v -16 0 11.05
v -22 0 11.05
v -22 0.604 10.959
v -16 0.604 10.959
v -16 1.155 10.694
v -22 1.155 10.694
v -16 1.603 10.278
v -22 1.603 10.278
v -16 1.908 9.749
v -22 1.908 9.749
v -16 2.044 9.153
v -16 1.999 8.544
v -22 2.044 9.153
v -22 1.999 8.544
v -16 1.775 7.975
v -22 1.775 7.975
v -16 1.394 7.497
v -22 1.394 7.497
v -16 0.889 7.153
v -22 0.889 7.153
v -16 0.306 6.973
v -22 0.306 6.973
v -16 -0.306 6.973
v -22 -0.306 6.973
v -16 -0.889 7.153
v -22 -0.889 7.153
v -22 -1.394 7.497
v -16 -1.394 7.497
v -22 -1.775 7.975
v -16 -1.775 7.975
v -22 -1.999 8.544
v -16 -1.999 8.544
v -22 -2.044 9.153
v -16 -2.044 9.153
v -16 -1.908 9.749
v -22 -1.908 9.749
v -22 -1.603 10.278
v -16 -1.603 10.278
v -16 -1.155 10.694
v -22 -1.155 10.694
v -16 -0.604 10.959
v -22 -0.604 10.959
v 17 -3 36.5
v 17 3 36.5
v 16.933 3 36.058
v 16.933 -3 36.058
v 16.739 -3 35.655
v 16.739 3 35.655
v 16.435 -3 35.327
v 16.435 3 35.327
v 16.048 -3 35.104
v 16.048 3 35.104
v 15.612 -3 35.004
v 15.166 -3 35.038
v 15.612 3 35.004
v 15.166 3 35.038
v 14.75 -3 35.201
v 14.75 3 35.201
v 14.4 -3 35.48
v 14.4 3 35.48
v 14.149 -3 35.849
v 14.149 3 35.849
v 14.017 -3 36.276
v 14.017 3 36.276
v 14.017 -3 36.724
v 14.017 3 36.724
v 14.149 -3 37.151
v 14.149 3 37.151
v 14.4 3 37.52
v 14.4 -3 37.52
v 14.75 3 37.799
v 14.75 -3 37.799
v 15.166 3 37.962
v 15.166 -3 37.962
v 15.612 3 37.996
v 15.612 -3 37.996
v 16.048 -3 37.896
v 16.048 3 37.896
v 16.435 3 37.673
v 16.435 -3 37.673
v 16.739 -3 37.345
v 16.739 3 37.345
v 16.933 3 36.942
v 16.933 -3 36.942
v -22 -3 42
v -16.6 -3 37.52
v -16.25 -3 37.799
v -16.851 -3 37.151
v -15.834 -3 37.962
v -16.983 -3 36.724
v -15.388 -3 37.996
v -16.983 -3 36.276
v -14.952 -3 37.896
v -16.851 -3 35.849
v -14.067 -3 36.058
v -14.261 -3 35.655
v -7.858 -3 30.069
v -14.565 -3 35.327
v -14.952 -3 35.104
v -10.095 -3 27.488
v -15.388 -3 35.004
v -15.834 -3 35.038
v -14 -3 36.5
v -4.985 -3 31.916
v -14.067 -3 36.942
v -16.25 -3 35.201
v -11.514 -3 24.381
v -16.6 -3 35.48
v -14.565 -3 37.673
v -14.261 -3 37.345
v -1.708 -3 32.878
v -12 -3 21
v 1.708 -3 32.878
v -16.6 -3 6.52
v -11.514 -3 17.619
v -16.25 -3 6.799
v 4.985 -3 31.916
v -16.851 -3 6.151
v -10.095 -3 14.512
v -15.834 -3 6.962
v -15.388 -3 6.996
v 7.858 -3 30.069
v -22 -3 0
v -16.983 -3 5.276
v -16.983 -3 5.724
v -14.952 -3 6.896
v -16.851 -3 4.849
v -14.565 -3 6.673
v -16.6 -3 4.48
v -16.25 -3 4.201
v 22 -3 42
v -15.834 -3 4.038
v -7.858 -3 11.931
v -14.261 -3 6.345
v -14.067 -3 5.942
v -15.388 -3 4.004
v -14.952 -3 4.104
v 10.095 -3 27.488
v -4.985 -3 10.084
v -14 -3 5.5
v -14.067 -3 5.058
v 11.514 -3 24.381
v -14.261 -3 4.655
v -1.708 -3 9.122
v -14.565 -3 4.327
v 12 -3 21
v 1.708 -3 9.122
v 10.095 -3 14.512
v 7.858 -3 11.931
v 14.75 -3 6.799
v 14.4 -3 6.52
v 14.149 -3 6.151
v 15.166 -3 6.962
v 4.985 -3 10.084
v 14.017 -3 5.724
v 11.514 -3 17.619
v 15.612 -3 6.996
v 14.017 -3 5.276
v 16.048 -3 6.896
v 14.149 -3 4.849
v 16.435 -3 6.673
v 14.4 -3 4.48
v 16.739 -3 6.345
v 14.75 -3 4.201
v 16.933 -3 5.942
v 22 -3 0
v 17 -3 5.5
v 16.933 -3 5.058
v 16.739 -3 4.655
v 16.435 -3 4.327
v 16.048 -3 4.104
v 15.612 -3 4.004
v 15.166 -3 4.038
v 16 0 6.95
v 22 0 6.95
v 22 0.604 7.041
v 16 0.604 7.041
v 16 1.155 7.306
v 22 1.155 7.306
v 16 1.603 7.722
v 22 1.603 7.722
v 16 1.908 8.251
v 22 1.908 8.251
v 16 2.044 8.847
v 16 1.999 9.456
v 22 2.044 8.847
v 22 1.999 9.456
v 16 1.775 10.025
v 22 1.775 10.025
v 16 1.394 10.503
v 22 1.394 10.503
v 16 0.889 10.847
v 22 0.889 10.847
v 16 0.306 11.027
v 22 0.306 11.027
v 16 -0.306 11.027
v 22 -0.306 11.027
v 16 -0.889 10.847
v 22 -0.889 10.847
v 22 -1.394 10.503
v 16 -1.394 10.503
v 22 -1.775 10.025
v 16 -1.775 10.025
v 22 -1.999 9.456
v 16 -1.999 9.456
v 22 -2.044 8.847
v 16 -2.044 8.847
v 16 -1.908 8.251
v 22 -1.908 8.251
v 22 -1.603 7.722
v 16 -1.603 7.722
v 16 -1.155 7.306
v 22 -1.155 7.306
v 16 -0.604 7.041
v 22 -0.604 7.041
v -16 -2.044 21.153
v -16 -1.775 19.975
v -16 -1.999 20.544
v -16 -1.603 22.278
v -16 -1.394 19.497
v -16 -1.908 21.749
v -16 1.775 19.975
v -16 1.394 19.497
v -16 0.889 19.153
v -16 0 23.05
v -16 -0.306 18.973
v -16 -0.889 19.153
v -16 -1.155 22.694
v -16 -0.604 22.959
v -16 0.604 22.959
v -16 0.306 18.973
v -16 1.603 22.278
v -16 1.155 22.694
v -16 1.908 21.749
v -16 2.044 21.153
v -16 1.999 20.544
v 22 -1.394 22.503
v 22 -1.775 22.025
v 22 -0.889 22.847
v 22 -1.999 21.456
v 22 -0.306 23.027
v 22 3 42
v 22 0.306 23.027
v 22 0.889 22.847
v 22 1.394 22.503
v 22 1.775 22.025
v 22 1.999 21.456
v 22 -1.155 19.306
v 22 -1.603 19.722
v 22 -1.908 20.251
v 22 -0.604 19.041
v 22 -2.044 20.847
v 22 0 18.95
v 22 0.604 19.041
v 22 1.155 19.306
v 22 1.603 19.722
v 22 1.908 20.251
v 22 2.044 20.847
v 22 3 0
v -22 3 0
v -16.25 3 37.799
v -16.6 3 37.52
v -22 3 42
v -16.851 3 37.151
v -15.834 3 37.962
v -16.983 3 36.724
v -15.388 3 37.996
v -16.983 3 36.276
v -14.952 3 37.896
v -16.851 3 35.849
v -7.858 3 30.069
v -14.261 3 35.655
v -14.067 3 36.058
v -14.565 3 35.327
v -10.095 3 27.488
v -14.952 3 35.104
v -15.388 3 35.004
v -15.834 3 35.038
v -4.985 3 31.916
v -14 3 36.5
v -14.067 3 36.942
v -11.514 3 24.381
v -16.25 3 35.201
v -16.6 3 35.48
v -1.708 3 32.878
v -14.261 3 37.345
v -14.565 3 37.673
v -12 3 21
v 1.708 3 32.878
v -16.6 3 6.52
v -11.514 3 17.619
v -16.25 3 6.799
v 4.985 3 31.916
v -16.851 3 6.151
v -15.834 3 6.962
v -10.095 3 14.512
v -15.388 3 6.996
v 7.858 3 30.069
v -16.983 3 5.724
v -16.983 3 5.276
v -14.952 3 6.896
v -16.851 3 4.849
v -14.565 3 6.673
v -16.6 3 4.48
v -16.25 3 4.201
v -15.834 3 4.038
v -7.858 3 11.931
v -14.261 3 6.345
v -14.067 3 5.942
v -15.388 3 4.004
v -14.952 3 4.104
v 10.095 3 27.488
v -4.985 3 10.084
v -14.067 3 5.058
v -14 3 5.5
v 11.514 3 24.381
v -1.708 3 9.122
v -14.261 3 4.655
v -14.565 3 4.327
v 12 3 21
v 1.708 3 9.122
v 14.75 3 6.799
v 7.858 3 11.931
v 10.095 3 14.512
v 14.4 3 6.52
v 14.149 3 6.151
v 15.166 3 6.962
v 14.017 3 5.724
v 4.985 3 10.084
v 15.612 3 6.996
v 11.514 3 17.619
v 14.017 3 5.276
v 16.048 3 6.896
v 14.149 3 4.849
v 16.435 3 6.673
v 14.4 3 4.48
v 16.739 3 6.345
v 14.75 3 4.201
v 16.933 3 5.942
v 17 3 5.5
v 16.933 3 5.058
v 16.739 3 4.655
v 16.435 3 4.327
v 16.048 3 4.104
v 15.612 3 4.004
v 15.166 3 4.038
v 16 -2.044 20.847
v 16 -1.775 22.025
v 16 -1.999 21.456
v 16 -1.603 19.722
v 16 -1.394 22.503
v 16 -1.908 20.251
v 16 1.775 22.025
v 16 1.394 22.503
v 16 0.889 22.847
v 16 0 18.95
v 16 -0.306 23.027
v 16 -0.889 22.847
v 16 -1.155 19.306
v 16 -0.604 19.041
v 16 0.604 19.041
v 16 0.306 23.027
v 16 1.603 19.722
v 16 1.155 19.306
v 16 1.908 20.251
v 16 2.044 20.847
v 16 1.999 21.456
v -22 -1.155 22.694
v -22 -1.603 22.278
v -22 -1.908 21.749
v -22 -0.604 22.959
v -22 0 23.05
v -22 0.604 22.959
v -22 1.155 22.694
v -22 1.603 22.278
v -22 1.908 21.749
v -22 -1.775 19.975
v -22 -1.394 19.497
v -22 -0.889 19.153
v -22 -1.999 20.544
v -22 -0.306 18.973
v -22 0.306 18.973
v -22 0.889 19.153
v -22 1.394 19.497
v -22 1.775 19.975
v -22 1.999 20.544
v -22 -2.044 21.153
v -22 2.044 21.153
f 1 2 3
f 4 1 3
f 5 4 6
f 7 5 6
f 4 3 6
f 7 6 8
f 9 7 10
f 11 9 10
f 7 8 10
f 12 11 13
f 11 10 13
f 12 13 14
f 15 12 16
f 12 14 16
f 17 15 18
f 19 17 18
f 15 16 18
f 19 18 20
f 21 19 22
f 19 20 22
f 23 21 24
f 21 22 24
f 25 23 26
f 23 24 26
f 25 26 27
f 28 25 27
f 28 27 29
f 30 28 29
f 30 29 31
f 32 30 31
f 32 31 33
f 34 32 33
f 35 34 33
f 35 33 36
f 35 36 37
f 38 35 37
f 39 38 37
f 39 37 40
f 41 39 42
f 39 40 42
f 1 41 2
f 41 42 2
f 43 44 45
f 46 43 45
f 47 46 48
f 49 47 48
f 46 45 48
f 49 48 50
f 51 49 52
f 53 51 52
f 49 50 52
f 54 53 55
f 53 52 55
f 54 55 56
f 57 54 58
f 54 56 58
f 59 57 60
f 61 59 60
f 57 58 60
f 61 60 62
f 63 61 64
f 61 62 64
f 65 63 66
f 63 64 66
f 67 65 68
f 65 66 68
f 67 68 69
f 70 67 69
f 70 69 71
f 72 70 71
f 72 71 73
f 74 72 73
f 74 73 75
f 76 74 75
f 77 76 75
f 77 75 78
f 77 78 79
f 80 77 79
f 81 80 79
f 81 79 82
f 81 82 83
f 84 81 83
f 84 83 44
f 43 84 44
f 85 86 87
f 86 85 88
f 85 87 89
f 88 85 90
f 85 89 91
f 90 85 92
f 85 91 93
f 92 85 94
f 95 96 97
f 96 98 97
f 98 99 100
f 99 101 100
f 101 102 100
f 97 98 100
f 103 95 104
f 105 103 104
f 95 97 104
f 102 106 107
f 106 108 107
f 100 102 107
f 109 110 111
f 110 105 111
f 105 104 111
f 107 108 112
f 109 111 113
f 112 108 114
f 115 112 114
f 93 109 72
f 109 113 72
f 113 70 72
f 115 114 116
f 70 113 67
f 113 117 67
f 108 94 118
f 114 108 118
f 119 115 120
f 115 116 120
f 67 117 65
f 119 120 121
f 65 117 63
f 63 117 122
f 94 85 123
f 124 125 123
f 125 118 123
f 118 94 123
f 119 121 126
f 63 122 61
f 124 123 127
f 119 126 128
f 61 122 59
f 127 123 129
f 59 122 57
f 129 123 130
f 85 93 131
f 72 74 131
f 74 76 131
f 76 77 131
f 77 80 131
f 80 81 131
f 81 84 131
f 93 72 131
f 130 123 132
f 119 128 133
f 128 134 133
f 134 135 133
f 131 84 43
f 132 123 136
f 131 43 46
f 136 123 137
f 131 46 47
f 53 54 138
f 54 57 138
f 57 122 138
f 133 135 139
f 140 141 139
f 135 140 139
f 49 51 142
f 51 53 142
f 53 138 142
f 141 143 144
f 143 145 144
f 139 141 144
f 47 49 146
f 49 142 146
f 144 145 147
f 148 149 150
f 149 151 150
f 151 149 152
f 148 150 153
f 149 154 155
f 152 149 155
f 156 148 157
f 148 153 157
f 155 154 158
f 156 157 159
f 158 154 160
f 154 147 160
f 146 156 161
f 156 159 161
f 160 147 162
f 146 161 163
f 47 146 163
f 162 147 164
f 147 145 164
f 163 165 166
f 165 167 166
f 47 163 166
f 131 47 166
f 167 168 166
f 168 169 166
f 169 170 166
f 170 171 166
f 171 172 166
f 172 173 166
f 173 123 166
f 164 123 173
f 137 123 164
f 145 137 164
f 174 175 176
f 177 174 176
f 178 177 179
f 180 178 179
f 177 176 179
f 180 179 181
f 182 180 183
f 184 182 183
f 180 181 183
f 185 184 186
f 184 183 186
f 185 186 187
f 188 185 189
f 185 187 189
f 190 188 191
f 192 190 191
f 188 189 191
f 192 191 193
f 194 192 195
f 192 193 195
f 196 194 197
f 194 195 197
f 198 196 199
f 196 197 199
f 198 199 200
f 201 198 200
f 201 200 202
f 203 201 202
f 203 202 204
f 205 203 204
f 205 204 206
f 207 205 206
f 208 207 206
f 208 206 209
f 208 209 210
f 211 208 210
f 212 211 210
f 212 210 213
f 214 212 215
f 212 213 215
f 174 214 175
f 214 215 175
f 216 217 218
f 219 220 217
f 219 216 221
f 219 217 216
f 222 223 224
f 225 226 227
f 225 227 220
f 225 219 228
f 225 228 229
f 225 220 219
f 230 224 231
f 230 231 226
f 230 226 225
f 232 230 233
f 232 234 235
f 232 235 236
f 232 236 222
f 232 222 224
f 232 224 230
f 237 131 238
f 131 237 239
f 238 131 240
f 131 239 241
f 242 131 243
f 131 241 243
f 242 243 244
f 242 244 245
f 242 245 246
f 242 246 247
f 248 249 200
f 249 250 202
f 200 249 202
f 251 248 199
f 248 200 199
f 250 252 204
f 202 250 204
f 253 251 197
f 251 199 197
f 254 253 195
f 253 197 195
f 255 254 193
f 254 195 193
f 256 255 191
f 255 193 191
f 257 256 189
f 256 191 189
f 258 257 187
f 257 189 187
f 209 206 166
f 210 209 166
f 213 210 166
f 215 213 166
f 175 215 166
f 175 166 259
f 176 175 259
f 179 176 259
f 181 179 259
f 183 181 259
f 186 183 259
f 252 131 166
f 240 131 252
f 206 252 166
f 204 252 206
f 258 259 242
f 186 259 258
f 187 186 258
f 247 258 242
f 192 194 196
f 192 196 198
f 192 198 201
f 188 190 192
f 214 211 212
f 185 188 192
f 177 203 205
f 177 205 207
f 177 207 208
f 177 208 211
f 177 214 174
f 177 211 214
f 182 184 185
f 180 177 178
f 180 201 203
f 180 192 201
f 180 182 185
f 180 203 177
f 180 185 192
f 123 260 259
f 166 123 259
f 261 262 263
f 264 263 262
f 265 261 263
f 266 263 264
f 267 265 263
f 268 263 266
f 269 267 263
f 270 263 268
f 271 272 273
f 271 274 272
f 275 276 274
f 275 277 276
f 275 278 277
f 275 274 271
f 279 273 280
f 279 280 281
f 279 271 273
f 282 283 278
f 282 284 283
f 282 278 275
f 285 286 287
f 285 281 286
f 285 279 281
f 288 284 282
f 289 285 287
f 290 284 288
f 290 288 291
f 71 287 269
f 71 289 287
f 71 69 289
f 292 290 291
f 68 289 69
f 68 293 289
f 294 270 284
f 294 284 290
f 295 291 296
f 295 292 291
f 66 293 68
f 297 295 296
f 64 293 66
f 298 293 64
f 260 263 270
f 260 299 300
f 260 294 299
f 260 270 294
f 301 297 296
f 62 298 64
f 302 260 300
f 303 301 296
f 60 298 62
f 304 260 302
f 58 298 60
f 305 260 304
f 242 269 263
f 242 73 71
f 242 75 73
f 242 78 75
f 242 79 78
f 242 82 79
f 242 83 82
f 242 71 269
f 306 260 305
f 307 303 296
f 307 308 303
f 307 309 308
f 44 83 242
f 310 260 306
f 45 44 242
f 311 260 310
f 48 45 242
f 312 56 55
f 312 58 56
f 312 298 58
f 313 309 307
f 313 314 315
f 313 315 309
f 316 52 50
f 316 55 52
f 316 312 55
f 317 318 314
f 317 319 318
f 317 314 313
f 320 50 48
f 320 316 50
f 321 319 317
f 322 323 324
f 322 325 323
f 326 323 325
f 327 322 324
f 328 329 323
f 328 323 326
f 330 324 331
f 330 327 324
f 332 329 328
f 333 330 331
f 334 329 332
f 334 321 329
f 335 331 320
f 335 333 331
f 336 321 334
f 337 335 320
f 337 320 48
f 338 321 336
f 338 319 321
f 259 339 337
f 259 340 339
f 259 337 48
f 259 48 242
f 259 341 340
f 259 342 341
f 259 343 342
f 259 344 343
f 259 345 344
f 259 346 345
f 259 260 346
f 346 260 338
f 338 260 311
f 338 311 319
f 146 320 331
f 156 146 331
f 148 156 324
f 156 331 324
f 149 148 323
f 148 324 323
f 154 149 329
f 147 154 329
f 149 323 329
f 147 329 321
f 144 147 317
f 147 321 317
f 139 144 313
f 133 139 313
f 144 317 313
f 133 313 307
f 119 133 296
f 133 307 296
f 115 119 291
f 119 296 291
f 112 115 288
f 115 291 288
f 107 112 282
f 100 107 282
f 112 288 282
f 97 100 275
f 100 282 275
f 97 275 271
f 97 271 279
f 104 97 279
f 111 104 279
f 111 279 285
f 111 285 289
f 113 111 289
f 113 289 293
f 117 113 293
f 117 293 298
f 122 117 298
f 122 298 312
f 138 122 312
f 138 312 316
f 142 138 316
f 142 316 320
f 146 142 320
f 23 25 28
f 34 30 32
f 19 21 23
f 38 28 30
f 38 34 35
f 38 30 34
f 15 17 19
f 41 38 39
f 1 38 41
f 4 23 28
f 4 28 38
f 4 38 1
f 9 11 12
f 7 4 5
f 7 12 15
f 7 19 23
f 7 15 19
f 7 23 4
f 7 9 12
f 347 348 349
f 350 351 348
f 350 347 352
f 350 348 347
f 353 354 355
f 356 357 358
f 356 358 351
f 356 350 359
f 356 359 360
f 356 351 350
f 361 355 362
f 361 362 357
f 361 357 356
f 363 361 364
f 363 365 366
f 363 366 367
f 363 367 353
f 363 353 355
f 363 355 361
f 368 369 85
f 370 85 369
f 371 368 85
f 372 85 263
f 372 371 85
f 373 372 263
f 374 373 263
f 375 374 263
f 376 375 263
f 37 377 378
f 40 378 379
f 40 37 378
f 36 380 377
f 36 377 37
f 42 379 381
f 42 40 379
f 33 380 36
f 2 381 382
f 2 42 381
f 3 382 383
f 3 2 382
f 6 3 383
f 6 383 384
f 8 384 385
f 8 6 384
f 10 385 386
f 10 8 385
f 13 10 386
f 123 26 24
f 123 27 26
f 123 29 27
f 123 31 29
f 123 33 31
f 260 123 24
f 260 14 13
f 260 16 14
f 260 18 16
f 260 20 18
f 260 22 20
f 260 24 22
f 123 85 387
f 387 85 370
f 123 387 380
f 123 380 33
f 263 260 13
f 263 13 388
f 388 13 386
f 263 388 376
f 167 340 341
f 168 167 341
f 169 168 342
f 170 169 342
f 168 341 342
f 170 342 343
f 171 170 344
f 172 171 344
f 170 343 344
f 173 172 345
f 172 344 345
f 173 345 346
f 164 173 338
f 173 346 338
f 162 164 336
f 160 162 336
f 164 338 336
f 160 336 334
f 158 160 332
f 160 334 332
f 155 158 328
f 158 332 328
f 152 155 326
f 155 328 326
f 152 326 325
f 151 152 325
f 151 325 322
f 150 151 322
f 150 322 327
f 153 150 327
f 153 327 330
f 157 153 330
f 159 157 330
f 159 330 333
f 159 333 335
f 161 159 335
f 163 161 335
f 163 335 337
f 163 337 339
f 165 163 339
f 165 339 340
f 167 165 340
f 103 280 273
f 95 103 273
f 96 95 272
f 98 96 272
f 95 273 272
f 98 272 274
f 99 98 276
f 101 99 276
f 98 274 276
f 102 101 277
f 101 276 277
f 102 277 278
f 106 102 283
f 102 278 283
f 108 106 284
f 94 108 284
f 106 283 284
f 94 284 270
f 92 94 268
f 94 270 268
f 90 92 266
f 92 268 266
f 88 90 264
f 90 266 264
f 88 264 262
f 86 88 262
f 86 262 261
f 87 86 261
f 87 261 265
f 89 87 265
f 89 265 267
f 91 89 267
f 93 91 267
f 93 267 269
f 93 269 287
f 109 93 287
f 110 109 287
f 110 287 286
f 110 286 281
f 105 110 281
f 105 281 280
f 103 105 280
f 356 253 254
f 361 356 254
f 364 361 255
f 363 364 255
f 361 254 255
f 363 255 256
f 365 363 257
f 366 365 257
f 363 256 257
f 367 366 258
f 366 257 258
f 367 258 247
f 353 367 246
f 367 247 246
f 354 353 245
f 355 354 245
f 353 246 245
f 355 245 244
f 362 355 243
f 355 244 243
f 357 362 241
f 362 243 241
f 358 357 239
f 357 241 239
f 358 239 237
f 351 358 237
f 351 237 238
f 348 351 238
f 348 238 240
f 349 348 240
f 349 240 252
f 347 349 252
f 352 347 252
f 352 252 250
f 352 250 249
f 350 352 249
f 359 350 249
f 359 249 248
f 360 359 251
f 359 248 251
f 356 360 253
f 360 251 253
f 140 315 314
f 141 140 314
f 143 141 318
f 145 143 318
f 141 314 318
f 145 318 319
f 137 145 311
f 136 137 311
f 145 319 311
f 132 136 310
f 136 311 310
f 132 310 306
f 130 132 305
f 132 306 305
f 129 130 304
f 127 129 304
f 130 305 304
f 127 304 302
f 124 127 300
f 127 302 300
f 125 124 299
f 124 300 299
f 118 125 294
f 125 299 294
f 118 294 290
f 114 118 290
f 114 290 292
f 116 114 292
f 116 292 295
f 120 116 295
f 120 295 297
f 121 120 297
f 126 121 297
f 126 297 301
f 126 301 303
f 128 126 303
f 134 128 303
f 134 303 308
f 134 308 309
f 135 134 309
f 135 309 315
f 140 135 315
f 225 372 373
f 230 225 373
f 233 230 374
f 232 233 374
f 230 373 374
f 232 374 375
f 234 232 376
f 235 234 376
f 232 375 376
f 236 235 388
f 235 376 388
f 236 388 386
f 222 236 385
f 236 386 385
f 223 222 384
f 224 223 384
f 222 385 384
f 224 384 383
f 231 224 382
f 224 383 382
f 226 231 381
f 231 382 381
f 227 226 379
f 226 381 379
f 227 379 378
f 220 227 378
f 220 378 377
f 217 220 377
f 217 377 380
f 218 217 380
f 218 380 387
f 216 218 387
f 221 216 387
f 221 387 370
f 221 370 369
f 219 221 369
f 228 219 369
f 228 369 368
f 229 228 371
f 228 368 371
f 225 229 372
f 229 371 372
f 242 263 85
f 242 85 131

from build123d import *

# Parameters (mm, degrees)
SKETCH1_W           = 44
SKETCH1_H           = 6
BOSS_EXTRUDE1_DEPTH = 42
CUT_EXTRUDE4_REACH  = 8
SKETCH5_R           = 12
SKETCH5_R_2         = 1.5
SKETCH6_R           = 2.05
CUT_EXTRUDE5_DEPTH  = 6
SKETCH7_R           = 2.05
CUT_EXTRUDE6_DEPTH  = 6


with BuildPart() as part:
    # Sketch1 → Boss-Extrude1 (new body)
    with BuildSketch(Plane.XY):
        Rectangle(SKETCH1_W, SKETCH1_H)
    extrude(amount=BOSS_EXTRUDE1_DEPTH)

    # Sketch5 → Cut-Extrude4 (cut, up to next)
    with BuildSketch(Plane(origin=(0, 3, 0), x_dir=(1, 0, 0), z_dir=(0, 1, 0)), mode=Mode.PRIVATE) as cut_extrude4_sk1:
        with Locations((0, -21)):
            Circle(SKETCH5_R)
    cut_extrude4_tool1 = extrude(cut_extrude4_sk1.sketch, amount=-CUT_EXTRUDE4_REACH, mode=Mode.PRIVATE) & part.part
    add(cut_extrude4_tool1.solids().sort_by_distance((0, 3, 21))[0], mode=Mode.SUBTRACT)
    # Sketch5 → Cut-Extrude4 (cut, up to next)
    with BuildSketch(Plane(origin=(0, 3, 0), x_dir=(1, 0, 0), z_dir=(0, 1, 0)), mode=Mode.PRIVATE) as cut_extrude4_sk2:
        with Locations((-15.5, -5.5)):
            Circle(SKETCH5_R_2)
    cut_extrude4_tool2 = extrude(cut_extrude4_sk2.sketch, amount=-CUT_EXTRUDE4_REACH, mode=Mode.PRIVATE) & part.part
    add(cut_extrude4_tool2.solids().sort_by_distance((-15.5, 3, 5.5))[0], mode=Mode.SUBTRACT)
    # Sketch5 → Cut-Extrude4 (cut, up to next)
    with BuildSketch(Plane(origin=(0, 3, 0), x_dir=(1, 0, 0), z_dir=(0, 1, 0)), mode=Mode.PRIVATE) as cut_extrude4_sk3:
        with Locations((15.5, -5.5)):
            Circle(SKETCH5_R_2)
    cut_extrude4_tool3 = extrude(cut_extrude4_sk3.sketch, amount=-CUT_EXTRUDE4_REACH, mode=Mode.PRIVATE) & part.part
    add(cut_extrude4_tool3.solids().sort_by_distance((15.5, 3, 5.5))[0], mode=Mode.SUBTRACT)
    # Sketch5 → Cut-Extrude4 (cut, up to next)
    with BuildSketch(Plane(origin=(0, 3, 0), x_dir=(1, 0, 0), z_dir=(0, 1, 0)), mode=Mode.PRIVATE) as cut_extrude4_sk4:
        with Locations((15.5, -36.5)):
            Circle(SKETCH5_R_2)
    cut_extrude4_tool4 = extrude(cut_extrude4_sk4.sketch, amount=-CUT_EXTRUDE4_REACH, mode=Mode.PRIVATE) & part.part
    add(cut_extrude4_tool4.solids().sort_by_distance((15.5, 3, 36.5))[0], mode=Mode.SUBTRACT)
    # Sketch5 → Cut-Extrude4 (cut, up to next)
    with BuildSketch(Plane(origin=(0, 3, 0), x_dir=(1, 0, 0), z_dir=(0, 1, 0)), mode=Mode.PRIVATE) as cut_extrude4_sk5:
        with Locations((-15.5, -36.5)):
            Circle(SKETCH5_R_2)
    cut_extrude4_tool5 = extrude(cut_extrude4_sk5.sketch, amount=-CUT_EXTRUDE4_REACH, mode=Mode.PRIVATE) & part.part
    add(cut_extrude4_tool5.solids().sort_by_distance((-15.5, 3, 36.5))[0], mode=Mode.SUBTRACT)

    # Sketch6 → Cut-Extrude5 (cut)
    with BuildSketch(Plane.ZY.offset(22)):
        with Locations((9, 0)):
            Circle(SKETCH6_R)
        with Locations((21, 0)):
            Circle(SKETCH6_R)
    extrude(amount=-CUT_EXTRUDE5_DEPTH, mode=Mode.SUBTRACT)

    # Sketch7 → Cut-Extrude6 (cut)
    with BuildSketch(Plane(origin=(22, 0, 0), x_dir=(0, 0, -1), z_dir=(1, 0, 0))):
        with Locations((-9, 0)):
            Circle(SKETCH7_R)
        with Locations((-21, 0)):
            Circle(SKETCH7_R)
    extrude(amount=-CUT_EXTRUDE6_DEPTH, mode=Mode.SUBTRACT)


solid = part.part
